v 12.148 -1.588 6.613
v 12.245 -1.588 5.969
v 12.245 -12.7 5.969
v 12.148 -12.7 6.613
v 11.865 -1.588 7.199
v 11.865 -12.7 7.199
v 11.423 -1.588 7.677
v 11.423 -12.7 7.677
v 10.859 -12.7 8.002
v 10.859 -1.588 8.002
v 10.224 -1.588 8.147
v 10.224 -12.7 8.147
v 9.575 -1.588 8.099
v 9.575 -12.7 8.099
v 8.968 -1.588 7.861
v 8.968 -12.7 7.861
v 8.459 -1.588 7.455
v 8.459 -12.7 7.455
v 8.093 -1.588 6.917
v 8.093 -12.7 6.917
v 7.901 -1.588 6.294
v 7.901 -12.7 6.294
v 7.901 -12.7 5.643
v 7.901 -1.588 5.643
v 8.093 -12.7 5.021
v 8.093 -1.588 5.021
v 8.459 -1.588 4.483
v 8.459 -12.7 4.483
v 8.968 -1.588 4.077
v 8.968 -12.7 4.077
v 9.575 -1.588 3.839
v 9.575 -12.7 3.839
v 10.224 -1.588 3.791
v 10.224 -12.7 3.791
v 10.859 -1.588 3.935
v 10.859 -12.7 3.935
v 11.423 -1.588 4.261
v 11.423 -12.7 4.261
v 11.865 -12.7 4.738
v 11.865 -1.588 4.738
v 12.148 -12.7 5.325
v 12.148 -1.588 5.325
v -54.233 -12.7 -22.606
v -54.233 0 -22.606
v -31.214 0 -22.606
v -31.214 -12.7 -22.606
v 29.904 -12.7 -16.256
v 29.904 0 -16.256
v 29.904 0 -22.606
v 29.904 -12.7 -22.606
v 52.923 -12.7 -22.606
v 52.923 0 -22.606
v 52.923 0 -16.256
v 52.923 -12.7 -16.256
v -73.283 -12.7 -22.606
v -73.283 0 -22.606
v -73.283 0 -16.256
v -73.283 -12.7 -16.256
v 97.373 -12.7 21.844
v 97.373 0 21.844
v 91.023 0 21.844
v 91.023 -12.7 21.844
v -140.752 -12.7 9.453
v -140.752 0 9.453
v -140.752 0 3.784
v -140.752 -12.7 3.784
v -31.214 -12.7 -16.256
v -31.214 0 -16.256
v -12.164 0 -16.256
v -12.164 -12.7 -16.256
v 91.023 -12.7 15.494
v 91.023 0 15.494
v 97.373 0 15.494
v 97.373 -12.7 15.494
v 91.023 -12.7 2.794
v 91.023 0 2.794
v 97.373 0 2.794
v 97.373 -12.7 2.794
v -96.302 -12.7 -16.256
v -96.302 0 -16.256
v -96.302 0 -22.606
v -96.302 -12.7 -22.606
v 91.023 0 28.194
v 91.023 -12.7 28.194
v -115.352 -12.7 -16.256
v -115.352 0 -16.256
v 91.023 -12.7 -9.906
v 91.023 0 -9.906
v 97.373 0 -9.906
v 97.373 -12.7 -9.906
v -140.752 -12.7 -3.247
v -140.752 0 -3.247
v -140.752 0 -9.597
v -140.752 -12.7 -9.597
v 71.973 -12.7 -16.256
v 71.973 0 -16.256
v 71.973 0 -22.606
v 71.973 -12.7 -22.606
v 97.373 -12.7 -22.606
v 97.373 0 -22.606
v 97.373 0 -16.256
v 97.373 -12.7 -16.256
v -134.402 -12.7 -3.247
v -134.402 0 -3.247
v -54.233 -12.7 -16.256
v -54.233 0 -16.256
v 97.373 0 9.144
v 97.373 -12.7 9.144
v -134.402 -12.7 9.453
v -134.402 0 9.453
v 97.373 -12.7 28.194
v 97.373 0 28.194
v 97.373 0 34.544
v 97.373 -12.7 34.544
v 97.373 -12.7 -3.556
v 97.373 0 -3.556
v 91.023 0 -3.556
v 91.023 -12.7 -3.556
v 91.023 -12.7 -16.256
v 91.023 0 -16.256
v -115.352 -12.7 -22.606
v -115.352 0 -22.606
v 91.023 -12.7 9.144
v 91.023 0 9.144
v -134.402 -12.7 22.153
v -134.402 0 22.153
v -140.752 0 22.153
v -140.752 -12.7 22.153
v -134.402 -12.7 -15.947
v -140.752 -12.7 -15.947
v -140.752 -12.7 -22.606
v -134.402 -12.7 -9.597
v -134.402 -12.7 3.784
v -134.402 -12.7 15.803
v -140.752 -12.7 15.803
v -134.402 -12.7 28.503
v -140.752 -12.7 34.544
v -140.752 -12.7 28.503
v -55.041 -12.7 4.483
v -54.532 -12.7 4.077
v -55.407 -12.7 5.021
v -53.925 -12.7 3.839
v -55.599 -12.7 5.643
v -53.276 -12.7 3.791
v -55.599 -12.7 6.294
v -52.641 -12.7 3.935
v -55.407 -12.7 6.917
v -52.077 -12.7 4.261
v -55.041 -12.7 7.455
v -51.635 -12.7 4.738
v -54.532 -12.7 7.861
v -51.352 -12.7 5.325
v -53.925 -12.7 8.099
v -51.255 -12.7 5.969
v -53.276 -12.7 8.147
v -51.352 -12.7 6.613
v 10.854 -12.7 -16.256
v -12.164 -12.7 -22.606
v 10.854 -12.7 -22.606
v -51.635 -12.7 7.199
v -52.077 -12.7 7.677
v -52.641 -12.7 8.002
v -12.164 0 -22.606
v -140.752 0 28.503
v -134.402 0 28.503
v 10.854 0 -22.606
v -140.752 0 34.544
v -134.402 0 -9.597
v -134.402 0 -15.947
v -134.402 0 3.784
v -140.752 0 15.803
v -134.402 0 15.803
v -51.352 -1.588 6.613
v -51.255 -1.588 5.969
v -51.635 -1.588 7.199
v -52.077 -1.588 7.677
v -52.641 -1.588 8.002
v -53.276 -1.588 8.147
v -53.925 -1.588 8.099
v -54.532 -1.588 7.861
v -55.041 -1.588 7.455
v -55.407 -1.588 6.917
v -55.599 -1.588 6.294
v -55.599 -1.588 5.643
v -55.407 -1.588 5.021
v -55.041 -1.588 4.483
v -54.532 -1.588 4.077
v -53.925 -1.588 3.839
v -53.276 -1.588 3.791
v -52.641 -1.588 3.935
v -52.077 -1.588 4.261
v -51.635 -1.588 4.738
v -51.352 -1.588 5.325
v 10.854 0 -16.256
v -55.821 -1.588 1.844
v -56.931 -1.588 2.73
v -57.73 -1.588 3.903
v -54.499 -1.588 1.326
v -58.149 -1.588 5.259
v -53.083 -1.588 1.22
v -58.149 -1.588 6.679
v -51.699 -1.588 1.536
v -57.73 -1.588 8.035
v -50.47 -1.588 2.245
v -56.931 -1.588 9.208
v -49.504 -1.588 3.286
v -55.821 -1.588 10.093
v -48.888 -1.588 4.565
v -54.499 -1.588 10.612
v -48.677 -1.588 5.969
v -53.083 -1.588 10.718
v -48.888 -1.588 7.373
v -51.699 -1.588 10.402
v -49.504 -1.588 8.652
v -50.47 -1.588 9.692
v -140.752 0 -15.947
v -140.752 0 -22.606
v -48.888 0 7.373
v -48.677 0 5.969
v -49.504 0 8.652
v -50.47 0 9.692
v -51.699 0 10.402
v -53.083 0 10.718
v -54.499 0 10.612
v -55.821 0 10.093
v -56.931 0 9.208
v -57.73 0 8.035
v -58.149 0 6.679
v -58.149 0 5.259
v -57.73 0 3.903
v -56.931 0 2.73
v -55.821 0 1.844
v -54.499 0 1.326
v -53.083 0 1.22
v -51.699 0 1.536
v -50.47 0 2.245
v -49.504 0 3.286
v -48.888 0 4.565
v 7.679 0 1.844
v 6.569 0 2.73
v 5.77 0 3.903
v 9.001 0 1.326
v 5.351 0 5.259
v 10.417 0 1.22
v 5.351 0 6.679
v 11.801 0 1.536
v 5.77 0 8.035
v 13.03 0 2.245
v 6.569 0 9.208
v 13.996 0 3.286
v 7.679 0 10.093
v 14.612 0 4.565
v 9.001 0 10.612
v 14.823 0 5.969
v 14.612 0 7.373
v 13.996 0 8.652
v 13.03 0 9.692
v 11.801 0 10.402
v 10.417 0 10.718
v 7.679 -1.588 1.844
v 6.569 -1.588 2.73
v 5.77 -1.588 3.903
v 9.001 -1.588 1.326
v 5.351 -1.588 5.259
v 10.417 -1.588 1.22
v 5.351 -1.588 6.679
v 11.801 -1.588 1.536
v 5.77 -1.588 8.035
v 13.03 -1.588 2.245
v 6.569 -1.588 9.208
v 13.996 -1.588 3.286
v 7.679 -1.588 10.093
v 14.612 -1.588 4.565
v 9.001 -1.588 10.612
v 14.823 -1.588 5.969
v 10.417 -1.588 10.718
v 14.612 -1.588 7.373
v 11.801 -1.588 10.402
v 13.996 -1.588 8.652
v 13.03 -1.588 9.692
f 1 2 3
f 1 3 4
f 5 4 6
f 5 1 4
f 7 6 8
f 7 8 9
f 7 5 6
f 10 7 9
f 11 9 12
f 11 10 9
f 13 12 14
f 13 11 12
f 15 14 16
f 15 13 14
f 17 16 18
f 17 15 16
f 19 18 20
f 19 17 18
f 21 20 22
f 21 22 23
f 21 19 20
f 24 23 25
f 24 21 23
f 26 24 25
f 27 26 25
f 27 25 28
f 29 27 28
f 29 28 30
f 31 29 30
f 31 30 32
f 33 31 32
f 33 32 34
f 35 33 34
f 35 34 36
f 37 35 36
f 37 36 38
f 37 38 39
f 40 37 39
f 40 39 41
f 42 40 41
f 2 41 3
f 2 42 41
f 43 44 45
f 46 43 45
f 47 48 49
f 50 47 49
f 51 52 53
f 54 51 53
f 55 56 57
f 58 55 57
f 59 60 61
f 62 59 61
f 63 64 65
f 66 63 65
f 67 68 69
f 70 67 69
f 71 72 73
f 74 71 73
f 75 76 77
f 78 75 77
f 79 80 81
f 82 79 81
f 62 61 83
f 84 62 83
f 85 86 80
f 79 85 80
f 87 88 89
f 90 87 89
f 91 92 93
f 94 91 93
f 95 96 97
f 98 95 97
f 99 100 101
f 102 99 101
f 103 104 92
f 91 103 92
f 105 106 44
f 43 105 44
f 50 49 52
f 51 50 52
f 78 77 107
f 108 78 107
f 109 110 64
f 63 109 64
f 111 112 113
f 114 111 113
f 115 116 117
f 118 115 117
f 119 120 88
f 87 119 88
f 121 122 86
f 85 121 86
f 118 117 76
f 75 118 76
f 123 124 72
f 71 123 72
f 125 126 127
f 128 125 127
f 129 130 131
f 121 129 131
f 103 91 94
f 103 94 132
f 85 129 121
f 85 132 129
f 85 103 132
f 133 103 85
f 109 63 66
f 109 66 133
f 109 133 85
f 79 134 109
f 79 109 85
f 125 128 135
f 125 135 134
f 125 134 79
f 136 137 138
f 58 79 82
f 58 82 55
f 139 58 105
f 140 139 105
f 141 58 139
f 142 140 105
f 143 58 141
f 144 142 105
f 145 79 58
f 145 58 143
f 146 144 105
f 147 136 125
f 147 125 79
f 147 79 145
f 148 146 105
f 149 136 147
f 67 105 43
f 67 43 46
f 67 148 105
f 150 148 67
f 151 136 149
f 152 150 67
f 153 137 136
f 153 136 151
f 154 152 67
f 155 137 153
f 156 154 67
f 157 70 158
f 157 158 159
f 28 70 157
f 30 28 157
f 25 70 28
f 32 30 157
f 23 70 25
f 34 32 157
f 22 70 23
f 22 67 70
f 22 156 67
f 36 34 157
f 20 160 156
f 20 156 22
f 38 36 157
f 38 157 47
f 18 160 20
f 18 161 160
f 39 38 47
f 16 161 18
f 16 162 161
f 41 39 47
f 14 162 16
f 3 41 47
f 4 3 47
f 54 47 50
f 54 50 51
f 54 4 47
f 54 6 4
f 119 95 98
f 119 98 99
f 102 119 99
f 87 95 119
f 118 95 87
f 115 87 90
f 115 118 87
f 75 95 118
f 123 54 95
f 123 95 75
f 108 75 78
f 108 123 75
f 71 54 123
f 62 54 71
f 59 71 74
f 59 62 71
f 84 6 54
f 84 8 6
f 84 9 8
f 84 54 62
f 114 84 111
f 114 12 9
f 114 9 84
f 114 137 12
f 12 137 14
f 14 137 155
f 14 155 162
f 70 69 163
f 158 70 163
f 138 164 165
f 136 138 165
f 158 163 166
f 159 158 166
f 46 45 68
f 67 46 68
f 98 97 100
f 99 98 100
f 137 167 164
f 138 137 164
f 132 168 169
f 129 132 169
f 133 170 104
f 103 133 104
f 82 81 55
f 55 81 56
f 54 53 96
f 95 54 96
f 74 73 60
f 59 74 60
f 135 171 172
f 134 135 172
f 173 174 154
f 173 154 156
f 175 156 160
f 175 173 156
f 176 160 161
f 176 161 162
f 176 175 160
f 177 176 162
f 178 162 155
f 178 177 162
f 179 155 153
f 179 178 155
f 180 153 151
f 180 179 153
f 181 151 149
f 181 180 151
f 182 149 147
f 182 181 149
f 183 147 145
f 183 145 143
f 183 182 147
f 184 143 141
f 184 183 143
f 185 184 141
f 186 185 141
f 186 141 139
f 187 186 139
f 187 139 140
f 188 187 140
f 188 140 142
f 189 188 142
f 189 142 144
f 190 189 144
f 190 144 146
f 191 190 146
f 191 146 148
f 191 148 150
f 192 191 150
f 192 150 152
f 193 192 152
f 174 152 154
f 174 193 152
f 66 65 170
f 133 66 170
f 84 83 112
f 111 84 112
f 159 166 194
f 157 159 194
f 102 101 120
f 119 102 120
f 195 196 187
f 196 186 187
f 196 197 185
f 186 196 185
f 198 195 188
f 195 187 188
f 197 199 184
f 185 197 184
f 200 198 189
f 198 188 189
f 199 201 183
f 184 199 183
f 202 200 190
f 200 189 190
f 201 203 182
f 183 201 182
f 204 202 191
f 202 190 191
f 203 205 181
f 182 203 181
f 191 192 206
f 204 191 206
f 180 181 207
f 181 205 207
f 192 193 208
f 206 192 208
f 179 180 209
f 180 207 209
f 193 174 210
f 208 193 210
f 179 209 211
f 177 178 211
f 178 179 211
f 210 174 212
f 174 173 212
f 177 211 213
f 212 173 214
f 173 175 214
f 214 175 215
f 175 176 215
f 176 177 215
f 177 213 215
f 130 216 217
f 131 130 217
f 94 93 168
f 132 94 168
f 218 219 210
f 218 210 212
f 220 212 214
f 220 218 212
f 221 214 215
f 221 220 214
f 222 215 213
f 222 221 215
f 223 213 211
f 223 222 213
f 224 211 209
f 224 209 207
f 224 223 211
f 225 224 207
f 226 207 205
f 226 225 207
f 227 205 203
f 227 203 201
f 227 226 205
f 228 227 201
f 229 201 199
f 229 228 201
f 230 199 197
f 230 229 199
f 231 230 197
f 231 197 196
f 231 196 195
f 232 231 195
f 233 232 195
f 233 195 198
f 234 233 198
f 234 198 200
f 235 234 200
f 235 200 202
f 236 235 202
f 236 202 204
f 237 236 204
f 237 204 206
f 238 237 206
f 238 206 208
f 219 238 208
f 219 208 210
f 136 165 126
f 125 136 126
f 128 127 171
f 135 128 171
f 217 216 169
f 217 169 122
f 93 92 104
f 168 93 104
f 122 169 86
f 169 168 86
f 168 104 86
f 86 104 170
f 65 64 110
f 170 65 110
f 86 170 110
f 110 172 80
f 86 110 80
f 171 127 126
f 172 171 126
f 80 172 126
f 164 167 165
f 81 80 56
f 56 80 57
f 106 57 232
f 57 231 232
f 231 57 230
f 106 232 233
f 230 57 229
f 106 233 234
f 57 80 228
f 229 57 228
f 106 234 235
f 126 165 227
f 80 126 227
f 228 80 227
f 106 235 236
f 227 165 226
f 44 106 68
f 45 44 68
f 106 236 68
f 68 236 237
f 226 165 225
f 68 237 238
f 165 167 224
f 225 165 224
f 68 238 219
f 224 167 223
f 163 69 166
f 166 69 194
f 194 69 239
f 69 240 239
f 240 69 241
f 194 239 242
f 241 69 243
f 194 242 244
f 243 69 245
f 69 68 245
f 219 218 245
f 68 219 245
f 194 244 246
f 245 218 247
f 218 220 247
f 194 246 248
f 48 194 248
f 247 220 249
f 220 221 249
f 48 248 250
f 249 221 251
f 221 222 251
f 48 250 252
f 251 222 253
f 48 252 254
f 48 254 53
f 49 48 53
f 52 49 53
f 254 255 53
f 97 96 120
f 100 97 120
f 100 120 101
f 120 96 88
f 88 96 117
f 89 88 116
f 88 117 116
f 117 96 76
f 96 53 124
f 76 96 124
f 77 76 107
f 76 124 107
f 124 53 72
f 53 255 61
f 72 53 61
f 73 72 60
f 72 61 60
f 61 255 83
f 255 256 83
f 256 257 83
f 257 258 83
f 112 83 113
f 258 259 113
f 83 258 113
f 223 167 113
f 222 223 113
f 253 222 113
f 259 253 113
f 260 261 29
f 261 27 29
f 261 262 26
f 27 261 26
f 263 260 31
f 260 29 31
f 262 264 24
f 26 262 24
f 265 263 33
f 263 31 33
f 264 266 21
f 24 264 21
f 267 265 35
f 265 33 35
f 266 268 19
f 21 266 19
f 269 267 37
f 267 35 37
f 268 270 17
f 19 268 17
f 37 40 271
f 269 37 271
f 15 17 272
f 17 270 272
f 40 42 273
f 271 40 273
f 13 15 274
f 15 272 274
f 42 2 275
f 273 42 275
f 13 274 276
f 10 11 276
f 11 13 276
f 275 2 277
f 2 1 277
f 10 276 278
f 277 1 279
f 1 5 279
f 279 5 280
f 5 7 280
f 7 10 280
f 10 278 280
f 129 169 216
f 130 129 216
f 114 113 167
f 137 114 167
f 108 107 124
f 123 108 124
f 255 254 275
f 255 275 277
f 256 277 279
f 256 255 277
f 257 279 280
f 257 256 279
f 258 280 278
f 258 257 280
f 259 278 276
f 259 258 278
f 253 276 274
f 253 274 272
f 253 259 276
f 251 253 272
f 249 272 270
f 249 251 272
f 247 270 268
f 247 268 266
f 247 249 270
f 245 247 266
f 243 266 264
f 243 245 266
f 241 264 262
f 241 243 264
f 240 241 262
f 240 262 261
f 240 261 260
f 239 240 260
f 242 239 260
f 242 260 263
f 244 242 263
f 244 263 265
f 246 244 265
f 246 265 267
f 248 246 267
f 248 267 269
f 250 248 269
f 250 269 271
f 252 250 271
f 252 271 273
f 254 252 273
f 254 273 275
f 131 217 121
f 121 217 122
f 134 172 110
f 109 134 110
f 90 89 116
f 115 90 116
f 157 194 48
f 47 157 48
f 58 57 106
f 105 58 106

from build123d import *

# Parameters (mm, degrees)
F0_R     = 4.7625
F1_DEPTH = 12.7
F2_START = 1.5875
F0_R_2   = 2.1844
F2_DEPTH = 11.1125
F3_START = 1.5875
F3_DEPTH = 11.1125


# Not quite as in the source:
# - a feature names something its author has since deleted; it is built from what else it names


with BuildPart() as f1:
    # F0 (on Front) → F1 (new body)
    with BuildSketch(Plane.XZ):
        Polygon((97.3731166124, 28.1938837487), (97.3731166124, 34.5438837487), (-140.7518833876, 34.5438837487), (-140.7518833876, 28.5026916087), (-134.4018833876, 28.5026916087), (-134.4018833876, 22.1526916087), (-140.7518833876, 22.1526916087), (-140.7518833876, 15.8026916087), (-134.4018833876, 15.8026916087), (-134.4018833876, 9.4526916087), (-140.7518833876, 9.4526916087), (-140.7518833876, 3.7844837487), (-134.4018833876, 3.7844837487), (-134.4018833876, -3.2473083913), (-140.7518833876, -3.2473083913), (-140.7518833876, -9.5973083913), (-134.4018833876, -9.5973083913), (-134.4018833876, -15.9473083913), (-140.7518833876, -15.9473083913), (-140.7518833876, -22.6061162513), (-115.3518833876, -22.6061162513), (-115.3518833876, -16.2561162513), (-96.3018833876, -16.2561162513), (-96.3018833876, -22.6061162513), (-73.2831333876, -22.6061162513), (-73.2831333876, -16.2561162513), (-54.2331333876, -16.2561162513), (-54.2331333876, -22.6061162513), (-31.2143833876, -22.6061162513), (-31.2143833876, -16.2561162513), (-12.1643833876, -16.2561162513), (-12.1643833876, -22.6061162513), (10.8543666124, -22.6061162513), (10.8543666124, -16.2561162513), (29.9043666124, -16.2561162513), (29.9043666124, -22.6061162513), (52.9231166124, -22.6061162513), (52.9231166124, -16.2561162513), (71.9731166124, -16.2561162513), (71.9731166124, -22.6061162513), (97.3731166124, -22.6061162513), (97.3731166124, -16.2561162513), (91.0231166124, -16.2561162513), (91.0231166124, -9.9061162513), (97.3731166124, -9.9061162513), (97.3731166124, -3.5561162513), (91.0231166124, -3.5561162513), (91.0231166124, 2.7938837487), (97.3731166124, 2.7938837487), (97.3731166124, 9.1438837487), (91.0231166124, 9.1438837487), (91.0231166124, 15.4938837487), (97.3731166124, 15.4938837487), (97.3731166124, 21.8438837487), (91.0231166124, 21.8438837487), (91.0231166124, 28.1938837487), align=None)
        with Locations((-53.4393833876, 5.9688837487)):
            Circle(F0_R, mode=Mode.SUBTRACT)
        with Locations((10.0606166124, 5.9688837487)):
            Circle(F0_R, mode=Mode.SUBTRACT)
    extrude(amount=F1_DEPTH)

    # F0 (on Front) → F2 (join)
    with BuildSketch(Plane.XZ.offset(F2_START)):
        with Locations((-53.4393833876, 5.9688837487)):
            Circle(F0_R)
        with Locations((-53.4393833876, 5.9688837487)):
            Circle(F0_R_2, mode=Mode.SUBTRACT)
    extrude(amount=F2_DEPTH)

    # F0 (on Front) → F3 (join)
    with BuildSketch(Plane.XZ.offset(F3_START)):
        with Locations((10.0606166124, 5.9688837487)):
            Circle(F0_R)
        with Locations((10.0606166124, 5.9688837487)):
            Circle(F0_R_2, mode=Mode.SUBTRACT)
    extrude(amount=F3_DEPTH)


solid = f1.part
